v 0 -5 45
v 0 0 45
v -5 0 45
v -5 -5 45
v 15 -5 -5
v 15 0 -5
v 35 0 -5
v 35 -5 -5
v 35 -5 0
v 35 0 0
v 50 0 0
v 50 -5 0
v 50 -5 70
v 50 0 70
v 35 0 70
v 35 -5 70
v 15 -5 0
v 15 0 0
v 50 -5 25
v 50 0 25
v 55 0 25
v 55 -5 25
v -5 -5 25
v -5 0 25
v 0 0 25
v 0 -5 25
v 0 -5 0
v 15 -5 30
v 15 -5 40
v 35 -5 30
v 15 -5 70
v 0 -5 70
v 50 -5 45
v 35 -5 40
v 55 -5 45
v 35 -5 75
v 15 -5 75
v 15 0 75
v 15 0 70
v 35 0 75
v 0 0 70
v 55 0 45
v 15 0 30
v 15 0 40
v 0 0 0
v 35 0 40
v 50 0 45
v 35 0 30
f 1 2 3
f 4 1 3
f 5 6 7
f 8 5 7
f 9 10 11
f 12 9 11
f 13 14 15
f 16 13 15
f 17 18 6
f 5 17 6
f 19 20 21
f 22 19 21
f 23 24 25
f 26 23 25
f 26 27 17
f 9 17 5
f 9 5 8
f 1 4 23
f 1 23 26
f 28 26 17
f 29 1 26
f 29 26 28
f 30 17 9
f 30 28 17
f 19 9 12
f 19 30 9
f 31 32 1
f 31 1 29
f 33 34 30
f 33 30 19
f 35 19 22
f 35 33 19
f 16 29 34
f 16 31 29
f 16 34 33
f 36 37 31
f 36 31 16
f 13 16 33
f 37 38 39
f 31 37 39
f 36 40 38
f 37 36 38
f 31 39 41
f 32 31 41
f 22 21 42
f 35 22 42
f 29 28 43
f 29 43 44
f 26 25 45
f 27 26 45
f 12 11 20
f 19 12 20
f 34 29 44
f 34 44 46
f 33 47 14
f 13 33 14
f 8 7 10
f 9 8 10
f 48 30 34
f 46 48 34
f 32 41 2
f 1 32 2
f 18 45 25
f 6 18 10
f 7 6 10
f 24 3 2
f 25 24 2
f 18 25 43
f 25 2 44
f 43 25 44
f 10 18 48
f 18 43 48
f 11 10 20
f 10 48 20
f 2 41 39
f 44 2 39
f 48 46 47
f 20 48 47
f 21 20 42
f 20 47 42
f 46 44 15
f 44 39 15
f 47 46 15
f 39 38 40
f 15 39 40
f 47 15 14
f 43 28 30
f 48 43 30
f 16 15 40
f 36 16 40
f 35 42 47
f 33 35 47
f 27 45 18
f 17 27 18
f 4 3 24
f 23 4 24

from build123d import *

# Parameters (mm, degrees)
F1_DEPTH = 5
F2_W     = 20
F2_H     = 10
F3_DEPTH = 25


with BuildPart() as f1:
    # F0 (on Front) → F1 (new body)
    with BuildSketch(Plane.XZ):
        Polygon((0, 25), (0, 0), (15, 0), (15, -5), (35, -5), (35, 0), (50, 0), (50, 25), (55, 25), (55, 45), (50, 45), (50, 70), (35, 70), (35, 75), (15, 75), (15, 70), (0, 70), (0, 45), (-5, 45), (-5, 25), align=None)
    extrude(amount=F1_DEPTH)

    # F2 (on face) → F3 (cut)
    with BuildSketch(Plane.XZ.offset(5)):
        with Locations((25, 35)):
            Rectangle(F2_W, F2_H)
    extrude(amount=-F3_DEPTH, mode=Mode.SUBTRACT)


solid = f1.part
